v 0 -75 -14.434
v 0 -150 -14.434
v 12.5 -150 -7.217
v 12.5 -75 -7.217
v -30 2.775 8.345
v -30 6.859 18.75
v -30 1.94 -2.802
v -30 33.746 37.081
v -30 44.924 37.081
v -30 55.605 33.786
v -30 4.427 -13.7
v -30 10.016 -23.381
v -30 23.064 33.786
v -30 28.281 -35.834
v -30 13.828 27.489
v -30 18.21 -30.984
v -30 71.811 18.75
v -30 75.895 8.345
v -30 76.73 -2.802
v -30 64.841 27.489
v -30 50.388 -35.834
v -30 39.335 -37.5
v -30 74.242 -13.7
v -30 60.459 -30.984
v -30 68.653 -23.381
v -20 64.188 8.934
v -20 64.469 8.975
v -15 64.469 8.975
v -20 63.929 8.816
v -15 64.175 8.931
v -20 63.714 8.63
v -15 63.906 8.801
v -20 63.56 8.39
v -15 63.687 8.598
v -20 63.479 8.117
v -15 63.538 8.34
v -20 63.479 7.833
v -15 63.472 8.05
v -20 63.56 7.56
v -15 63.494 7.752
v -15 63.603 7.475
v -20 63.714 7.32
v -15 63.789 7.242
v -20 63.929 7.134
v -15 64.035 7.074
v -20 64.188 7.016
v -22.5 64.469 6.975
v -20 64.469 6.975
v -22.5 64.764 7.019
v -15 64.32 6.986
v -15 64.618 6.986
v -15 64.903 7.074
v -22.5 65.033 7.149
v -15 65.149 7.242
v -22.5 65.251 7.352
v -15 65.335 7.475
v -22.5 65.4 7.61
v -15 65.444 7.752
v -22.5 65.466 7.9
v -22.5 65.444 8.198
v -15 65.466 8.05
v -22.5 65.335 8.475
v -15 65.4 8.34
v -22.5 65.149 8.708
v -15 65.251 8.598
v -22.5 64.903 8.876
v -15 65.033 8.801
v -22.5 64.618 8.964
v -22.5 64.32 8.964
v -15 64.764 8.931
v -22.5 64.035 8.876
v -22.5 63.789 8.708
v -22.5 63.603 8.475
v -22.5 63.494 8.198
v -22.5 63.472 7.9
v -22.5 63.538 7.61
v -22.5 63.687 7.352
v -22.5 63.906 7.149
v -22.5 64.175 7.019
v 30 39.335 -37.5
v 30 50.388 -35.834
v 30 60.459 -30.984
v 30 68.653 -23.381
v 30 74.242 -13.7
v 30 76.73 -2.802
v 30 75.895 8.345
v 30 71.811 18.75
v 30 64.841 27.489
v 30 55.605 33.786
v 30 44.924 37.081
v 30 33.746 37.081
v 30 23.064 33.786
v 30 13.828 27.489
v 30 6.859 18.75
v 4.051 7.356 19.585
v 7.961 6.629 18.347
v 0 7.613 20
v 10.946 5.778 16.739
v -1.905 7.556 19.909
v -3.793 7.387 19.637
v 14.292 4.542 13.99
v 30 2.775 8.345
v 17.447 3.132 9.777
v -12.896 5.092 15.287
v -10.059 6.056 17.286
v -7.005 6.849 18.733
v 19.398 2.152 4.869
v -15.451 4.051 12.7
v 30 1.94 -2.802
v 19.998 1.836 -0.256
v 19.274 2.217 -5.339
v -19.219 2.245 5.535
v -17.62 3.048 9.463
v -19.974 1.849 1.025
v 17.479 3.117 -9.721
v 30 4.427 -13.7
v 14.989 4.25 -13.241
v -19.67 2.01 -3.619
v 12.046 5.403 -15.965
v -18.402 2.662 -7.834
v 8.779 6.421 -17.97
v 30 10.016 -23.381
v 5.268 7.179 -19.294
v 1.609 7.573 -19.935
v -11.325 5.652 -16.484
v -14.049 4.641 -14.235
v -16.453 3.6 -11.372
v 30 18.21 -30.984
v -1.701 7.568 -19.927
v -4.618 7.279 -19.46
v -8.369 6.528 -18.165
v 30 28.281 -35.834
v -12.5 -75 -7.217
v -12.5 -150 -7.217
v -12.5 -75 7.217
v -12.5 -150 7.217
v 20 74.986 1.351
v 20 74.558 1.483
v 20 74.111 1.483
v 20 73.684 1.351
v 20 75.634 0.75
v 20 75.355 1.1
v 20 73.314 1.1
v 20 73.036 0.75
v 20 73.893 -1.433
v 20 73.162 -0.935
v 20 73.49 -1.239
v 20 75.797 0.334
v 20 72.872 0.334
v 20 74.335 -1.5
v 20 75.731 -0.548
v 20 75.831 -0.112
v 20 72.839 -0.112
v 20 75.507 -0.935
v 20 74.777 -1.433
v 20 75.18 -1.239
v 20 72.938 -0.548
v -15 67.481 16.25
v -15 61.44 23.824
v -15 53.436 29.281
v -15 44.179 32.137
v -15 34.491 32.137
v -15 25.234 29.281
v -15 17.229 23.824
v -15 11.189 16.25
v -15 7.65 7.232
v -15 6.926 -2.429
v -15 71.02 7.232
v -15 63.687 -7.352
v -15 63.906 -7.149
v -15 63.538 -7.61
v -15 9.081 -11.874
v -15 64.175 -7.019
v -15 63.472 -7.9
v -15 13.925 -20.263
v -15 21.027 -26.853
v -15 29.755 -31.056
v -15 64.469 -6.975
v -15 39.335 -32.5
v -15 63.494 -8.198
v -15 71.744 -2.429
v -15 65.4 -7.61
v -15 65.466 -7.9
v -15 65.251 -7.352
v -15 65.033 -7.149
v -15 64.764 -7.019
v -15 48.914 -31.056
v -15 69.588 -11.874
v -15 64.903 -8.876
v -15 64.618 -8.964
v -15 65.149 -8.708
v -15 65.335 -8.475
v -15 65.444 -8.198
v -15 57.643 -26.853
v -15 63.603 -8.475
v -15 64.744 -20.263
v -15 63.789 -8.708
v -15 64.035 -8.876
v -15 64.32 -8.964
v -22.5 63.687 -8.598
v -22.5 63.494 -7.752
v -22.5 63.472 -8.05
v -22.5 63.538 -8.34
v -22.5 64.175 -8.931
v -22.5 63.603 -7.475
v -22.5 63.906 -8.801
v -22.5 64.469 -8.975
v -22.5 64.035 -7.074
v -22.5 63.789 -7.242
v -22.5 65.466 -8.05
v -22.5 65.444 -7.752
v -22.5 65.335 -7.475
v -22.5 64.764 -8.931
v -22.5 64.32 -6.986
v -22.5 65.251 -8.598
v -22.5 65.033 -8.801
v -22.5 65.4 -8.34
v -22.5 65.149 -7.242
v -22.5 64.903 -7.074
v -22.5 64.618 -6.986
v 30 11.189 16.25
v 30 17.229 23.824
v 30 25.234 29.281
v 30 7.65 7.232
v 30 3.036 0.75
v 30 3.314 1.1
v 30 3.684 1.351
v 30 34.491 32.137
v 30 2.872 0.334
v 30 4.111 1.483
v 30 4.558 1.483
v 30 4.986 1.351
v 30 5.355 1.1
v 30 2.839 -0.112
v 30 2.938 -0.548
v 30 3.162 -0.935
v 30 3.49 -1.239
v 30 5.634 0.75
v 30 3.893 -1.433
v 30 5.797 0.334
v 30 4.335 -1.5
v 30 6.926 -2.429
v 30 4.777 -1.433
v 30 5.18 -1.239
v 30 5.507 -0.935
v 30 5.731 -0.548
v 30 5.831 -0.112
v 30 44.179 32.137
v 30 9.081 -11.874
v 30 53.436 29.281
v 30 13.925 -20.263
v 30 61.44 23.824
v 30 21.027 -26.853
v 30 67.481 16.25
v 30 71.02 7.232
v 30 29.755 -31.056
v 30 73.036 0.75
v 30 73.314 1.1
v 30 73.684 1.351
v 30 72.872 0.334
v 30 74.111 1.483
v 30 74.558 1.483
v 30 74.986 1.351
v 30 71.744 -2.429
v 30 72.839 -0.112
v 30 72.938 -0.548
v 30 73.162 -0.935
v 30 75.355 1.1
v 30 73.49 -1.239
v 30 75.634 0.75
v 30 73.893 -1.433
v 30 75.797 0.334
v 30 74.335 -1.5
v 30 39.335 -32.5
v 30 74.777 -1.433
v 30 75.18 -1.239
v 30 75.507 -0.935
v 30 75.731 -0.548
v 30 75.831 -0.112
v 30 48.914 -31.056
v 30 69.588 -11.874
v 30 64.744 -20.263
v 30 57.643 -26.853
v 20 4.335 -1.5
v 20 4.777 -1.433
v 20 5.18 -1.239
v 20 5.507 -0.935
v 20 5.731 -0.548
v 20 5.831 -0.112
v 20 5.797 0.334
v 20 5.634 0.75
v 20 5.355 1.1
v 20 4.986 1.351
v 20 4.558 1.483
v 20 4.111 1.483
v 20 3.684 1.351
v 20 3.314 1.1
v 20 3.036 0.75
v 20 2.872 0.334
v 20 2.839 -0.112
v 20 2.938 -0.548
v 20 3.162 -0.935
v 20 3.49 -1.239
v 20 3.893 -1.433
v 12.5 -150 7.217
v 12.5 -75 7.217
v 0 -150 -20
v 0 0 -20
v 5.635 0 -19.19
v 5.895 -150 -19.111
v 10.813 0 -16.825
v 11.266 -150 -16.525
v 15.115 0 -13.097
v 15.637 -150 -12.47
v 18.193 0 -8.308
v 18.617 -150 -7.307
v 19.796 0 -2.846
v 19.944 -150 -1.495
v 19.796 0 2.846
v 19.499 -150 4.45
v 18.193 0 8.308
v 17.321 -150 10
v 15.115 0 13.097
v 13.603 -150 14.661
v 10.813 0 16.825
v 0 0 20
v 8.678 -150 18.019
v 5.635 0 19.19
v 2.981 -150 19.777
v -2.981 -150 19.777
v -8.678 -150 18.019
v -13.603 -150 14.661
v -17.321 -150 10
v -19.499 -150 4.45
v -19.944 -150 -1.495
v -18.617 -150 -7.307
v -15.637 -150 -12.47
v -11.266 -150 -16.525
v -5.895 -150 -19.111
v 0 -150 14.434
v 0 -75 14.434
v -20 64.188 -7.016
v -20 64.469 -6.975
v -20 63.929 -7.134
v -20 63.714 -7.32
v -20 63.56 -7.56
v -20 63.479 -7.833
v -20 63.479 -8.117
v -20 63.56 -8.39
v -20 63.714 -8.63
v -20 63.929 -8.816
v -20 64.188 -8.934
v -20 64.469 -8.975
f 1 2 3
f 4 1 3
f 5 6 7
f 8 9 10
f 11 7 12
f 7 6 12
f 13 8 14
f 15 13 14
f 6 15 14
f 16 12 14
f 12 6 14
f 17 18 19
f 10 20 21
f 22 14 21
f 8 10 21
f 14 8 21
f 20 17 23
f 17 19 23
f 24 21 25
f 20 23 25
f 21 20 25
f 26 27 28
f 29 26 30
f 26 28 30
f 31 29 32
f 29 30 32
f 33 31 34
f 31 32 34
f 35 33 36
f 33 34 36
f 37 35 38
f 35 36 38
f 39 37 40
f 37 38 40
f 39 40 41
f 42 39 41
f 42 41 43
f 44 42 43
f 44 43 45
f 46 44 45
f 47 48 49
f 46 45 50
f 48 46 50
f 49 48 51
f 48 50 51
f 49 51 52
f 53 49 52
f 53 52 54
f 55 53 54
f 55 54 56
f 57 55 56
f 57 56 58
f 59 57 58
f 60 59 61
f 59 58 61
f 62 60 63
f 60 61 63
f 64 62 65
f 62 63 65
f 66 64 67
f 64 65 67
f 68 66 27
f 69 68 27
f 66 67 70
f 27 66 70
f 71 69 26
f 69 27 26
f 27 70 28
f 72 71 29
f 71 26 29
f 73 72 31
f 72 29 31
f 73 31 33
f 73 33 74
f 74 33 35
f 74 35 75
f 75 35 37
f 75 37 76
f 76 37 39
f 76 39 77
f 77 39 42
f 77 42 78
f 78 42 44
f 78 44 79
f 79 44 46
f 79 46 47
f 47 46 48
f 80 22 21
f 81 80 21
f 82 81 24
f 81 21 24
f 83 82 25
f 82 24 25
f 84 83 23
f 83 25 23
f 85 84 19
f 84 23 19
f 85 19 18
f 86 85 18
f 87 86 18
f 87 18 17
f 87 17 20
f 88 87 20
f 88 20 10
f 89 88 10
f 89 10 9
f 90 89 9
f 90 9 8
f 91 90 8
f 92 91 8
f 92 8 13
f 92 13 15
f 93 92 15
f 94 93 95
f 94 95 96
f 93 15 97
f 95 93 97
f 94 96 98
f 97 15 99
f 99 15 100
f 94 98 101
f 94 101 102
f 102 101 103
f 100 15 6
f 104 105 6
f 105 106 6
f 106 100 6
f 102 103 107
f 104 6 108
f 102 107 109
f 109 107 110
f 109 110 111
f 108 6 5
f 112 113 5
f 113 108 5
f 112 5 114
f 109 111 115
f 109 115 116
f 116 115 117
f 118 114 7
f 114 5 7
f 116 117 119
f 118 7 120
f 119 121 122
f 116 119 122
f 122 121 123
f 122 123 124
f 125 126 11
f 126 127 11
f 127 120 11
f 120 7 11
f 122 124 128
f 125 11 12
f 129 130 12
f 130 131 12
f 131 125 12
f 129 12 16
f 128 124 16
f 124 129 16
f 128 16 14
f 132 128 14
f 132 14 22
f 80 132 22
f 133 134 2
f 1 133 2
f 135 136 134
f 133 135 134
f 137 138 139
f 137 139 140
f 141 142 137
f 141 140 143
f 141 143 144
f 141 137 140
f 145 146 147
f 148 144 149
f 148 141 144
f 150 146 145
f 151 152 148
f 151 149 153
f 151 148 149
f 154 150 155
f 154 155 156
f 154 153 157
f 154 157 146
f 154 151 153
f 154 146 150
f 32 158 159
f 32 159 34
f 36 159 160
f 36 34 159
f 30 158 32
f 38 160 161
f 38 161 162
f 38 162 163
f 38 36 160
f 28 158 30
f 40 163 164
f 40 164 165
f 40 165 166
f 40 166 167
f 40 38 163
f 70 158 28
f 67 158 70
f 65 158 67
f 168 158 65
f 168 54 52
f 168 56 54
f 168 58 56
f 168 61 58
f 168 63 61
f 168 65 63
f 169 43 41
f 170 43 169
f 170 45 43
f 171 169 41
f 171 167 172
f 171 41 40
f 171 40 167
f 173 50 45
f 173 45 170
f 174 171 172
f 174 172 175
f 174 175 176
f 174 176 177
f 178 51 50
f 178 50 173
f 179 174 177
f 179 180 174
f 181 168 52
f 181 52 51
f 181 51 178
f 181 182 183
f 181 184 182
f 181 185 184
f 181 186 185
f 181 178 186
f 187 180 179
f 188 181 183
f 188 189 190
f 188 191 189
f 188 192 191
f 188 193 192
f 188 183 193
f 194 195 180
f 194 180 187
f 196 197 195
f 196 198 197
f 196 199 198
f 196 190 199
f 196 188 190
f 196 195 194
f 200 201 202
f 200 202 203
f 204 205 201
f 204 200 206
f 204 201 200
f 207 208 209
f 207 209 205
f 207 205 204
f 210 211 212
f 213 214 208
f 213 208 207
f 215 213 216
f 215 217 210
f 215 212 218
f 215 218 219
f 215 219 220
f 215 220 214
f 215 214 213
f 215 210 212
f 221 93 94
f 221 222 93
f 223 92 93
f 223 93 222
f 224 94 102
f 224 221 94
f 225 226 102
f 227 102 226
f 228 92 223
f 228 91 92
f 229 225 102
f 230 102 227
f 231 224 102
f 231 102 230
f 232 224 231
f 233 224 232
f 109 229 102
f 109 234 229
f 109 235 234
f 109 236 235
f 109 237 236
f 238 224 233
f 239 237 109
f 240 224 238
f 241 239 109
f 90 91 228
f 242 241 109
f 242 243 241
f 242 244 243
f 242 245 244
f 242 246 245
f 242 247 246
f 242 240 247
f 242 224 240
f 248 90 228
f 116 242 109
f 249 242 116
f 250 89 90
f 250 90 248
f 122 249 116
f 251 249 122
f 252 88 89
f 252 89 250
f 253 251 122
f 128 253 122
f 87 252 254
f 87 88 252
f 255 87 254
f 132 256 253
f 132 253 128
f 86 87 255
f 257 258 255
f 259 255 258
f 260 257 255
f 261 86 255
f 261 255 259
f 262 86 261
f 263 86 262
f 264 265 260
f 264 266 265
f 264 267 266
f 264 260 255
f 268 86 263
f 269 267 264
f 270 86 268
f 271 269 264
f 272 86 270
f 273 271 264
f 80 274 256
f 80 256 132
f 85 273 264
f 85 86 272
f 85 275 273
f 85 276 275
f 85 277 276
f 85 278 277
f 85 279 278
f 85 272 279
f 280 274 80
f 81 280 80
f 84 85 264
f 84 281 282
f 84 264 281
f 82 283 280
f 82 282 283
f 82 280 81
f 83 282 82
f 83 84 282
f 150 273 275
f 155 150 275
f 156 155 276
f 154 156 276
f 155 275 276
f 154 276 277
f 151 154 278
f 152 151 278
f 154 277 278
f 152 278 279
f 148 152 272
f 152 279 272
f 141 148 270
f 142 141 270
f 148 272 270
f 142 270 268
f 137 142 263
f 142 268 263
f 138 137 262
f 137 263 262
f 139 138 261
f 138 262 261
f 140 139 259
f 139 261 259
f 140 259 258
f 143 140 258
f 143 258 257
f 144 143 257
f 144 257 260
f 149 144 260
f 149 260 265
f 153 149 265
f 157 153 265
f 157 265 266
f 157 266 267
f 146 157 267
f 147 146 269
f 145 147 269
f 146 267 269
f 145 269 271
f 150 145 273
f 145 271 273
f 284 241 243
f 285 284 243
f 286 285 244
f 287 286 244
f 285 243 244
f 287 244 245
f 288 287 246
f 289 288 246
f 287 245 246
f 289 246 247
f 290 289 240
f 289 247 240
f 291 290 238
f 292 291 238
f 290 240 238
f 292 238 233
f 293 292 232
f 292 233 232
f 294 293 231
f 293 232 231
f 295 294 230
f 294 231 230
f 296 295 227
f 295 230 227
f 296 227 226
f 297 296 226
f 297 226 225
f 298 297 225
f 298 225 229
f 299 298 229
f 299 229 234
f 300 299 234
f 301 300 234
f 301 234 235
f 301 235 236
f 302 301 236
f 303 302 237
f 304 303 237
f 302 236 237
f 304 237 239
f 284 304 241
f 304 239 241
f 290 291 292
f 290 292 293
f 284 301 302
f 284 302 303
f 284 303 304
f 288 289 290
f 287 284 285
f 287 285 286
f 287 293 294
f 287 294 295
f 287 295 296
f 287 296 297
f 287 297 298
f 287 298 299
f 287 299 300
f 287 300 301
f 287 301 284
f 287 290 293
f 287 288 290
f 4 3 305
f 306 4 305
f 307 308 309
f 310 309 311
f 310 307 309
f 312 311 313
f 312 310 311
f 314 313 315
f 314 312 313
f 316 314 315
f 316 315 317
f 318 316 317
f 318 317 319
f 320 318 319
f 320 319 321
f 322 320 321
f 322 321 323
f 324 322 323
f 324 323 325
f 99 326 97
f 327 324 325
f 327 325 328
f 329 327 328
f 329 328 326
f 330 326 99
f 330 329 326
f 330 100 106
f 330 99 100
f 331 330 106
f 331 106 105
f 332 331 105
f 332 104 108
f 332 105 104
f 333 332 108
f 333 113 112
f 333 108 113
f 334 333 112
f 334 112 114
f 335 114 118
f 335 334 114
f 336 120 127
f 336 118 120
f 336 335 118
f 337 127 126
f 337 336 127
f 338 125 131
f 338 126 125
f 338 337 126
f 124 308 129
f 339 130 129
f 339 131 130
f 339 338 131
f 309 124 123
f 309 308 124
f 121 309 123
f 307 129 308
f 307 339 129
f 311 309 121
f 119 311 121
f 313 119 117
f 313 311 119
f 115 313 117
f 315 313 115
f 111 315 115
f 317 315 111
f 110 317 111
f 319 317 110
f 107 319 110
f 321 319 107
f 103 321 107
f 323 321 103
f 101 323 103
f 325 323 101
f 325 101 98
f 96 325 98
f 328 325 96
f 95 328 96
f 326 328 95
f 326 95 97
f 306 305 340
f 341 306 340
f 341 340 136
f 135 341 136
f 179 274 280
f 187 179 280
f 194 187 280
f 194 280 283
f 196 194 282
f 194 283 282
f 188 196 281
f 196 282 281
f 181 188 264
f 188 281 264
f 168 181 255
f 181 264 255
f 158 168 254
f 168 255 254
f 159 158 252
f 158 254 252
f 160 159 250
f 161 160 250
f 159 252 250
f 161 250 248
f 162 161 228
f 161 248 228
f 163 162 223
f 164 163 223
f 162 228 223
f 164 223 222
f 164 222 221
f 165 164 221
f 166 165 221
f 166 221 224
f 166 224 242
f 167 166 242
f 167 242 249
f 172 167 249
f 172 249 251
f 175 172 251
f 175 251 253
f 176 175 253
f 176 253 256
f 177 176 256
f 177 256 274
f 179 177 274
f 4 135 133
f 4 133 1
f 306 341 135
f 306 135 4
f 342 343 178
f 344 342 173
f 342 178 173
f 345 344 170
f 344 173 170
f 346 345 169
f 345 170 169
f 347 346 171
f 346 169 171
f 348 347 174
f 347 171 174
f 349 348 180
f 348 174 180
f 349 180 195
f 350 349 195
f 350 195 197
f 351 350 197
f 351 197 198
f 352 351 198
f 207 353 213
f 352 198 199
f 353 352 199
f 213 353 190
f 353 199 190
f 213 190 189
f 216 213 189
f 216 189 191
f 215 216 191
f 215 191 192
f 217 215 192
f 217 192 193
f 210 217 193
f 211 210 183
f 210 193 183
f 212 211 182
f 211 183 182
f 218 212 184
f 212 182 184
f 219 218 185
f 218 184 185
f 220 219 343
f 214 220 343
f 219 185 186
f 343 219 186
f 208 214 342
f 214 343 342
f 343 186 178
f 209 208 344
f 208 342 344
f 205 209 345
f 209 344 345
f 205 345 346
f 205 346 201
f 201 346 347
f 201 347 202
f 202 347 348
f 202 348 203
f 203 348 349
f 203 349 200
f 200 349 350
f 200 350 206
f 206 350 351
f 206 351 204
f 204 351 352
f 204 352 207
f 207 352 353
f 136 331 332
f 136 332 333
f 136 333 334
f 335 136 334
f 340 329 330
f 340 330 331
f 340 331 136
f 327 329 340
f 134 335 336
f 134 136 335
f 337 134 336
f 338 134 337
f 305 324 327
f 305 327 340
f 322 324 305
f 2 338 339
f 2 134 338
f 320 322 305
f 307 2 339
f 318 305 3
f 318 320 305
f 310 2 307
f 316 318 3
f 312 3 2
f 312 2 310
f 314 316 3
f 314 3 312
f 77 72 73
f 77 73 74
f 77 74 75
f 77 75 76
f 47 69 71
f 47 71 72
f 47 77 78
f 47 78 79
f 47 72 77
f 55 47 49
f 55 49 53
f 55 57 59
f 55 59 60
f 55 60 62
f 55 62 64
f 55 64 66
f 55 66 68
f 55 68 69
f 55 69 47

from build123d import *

# Parameters (mm, degrees)
SKETCH1_R                 = 20
BOSS_EXTRUDE1_DEPTH       = 25
BOSS_EXTRUDE2_START       = 100
SKETCH2_R                 = 20
BOSS_EXTRUDE2_DEPTH       = 100
BOSS_EXTRUDE4_START       = -100
SKETCH6_R                 = 20
BOSS_EXTRUDE4_DEPTH       = 100
SKETCH7_R                 = 25
CUT_EXTRUDE2_DEPTH        = 40
SKETCH8_R                 = 25
SKETCH8_R_2               = 22.5
BOSS_EXTRUDE7_DEPTH       = 40
SKETCH9_R                 = 25
BOSS_EXTRUDE8_DEPTH       = 2
BOSS_EXTRUDE10_DEPTH      = 38
CUT_EXTRUDE3_DEPTH        = 25
SKETCH12_R                = 25
CUT_EXTRUDE4_DEPTH        = 75
BOSS_EXTRUDE11_START      = 50
SKETCH14_R                = 20
BOSS_EXTRUDE11_DEPTH      = 50
BOSS_EXTRUDE12_DEPTH      = 10
BOSS_EXTRUDE12_DEPTH_BACK = 50
SKETCH13_R                = 37.5
SKETCH17_R                = 32.5
CUT_EXTRUDE5_DEPTH        = 50
BOSS_EXTRUDE13_START      = 2
SKETCH18_R                = 37.5
SKETCH18_R_2              = 32.5
BOSS_EXTRUDE13_DEPTH      = 2
SKETCH21_R                = 37.5
SKETCH21_R_2              = 32.5
CUT_EXTRUDE6_DEPTH        = 2
SKETCH22_R                = 1.5
CUT_EXTRUDE7_DEPTH        = 10
BOSS_EXTRUDE14_START      = 5
SKETCH27_R                = 32.5
BOSS_EXTRUDE14_DEPTH      = 5
CUT_EXTRUDE8_DEPTH        = 5
SKETCH29_R                = 1
CUT_EXTRUDE9_DEPTH        = 2.5
SKETCH30_R                = 1
CUT_EXTRUDE10_DEPTH       = 2.5


with BuildPart() as part:
    # Sketch1 → Boss-Extrude1 (new body)
    with BuildSketch(Plane(origin=(0, 0, 0), x_dir=(1, 0, 0), z_dir=(0, 1, 0))):
        with Locations(Location((0, 0, 0), (0, 0, 270))):
            Circle(SKETCH1_R)
        Polygon((14.43375673, 0), (7.216878365, 12.5), (-7.216878365, 12.5), (-14.43375673, 0), (-7.216878365, -12.5), (7.216878365, -12.5), align=None, mode=Mode.SUBTRACT)
    extrude(amount=BOSS_EXTRUDE1_DEPTH)

    # Sketch2 → Boss-Extrude2 (add)
    with BuildSketch(Plane.XZ.offset(BOSS_EXTRUDE2_START)):
        with Locations(Location((0, 0, 0), (0, 0, 270))):
            Circle(SKETCH2_R)
    extrude(amount=-BOSS_EXTRUDE2_DEPTH)

    # Sketch6 → Boss-Extrude4 (add)
    with BuildSketch(Plane(origin=(0, 25, 0), x_dir=(1, 0, 0), z_dir=(0, 1, 0)).offset(BOSS_EXTRUDE4_START)):
        with Locations(Location((0, 0, 0), (0, 0, 90))):
            Circle(SKETCH6_R)
    extrude(amount=BOSS_EXTRUDE4_DEPTH)

    # Sketch7 → Cut-Extrude2 (cut)
    with BuildSketch(Plane(origin=(20, 0, 0), x_dir=(0, 0, -1), z_dir=(1, 0, 0))):
        with Locations((0, 39.286563349)):
            Circle(SKETCH7_R)
    extrude(amount=-CUT_EXTRUDE2_DEPTH, mode=Mode.SUBTRACT)

    # Sketch8 → Boss-Extrude7 (add)
    with BuildSketch(Plane(origin=(20, 0, 0), x_dir=(0, 0, -1), z_dir=(1, 0, 0))):
        with Locations((0, 39.252781264)):
            Circle(SKETCH8_R)
        with Locations((0, 39.252781264)):
            Circle(SKETCH8_R_2, mode=Mode.SUBTRACT)
    extrude(amount=-BOSS_EXTRUDE7_DEPTH)

    # Sketch9 → Boss-Extrude8 (add)
    with BuildSketch(Plane(origin=(20, 0, 0), x_dir=(0, 0, -1), z_dir=(1, 0, 0))):
        with Locations((0, 39.252781264)):
            Circle(SKETCH9_R)
    extrude(amount=-BOSS_EXTRUDE8_DEPTH)

    # Sketch10 → Boss-Extrude10 (add)
    with BuildSketch(Plane.ZY.offset(-18)):
        with BuildLine():
            Line((-15.081099266, 22.555163323), (15.081099266, 22.555163323))
            ThreePointArc((15.081099266, 22.555163323), (0, 16.752781264), (-15.081099266, 22.555163323))
        make_face()
    extrude(amount=BOSS_EXTRUDE10_DEPTH)

    # Sketch11 → Cut-Extrude3 (cut)
    with BuildSketch(Plane.XZ.offset(100)):
        Polygon((12.5, 7.216878365), (0, 14.43375673), (0, 0), (12.5, 0), align=None)
        Polygon((0, 0), (0, 14.43375673), (-12.5, 7.216878365), (-12.5, -7.216878365), (0, -14.43375673), (12.5, -7.216878365), (12.5, 0), align=None)
    extrude(amount=-CUT_EXTRUDE3_DEPTH, mode=Mode.SUBTRACT)

    # Sketch12 → Cut-Extrude4 (cut)
    with BuildSketch(Plane(origin=(20, 0, 0), x_dir=(0, 0, -1), z_dir=(1, 0, 0))):
        with Locations((0, 39.252781264)):
            Circle(SKETCH12_R)
    extrude(amount=-CUT_EXTRUDE4_DEPTH, mode=Mode.SUBTRACT)

    # Sketch14 → Boss-Extrude11 (add)
    with BuildSketch(Plane.XZ.offset(100).offset(BOSS_EXTRUDE11_START)):
        with Locations(Location((0, 0, 0), (0, 0, 270))):
            Circle(SKETCH14_R)
        Polygon((0, -14.43375673), (12.5, -7.216878365), (12.5, 7.216878365), (0, 14.43375673), (-12.5, 7.216878365), (-12.5, -7.216878365), align=None, mode=Mode.SUBTRACT)
    extrude(amount=-BOSS_EXTRUDE11_DEPTH)

    # Sketch13 → Boss-Extrude12 (add, two sides: drawn at the far end of the back side and taken through both)
    with BuildSketch(Plane(origin=(20, 0, 0), x_dir=(0, 0, -1), z_dir=(1, 0, 0)).offset(-BOSS_EXTRUDE12_DEPTH_BACK)):
        with Locations((0, 39.33472939)):
            Circle(SKETCH13_R)
    extrude(amount=BOSS_EXTRUDE12_DEPTH + BOSS_EXTRUDE12_DEPTH_BACK)

    # Sketch17 → Cut-Extrude5 (cut)
    with BuildSketch(Plane(origin=(30, 0, 0), x_dir=(0, 0, -1), z_dir=(1, 0, 0))):
        with Locations((0, 39.33472939)):
            Circle(SKETCH17_R)
    extrude(amount=-CUT_EXTRUDE5_DEPTH, mode=Mode.SUBTRACT)

    # Sketch18 → Boss-Extrude13 (add)
    with BuildSketch(Plane(origin=(30, 0, 0), x_dir=(0, 0, -1), z_dir=(1, 0, 0)).offset(BOSS_EXTRUDE13_START)):
        with Locations((0, 39.33472939)):
            Circle(SKETCH18_R)
        with Locations((0, 39.33472939)):
            Circle(SKETCH18_R_2, mode=Mode.SUBTRACT)
    extrude(amount=-BOSS_EXTRUDE13_DEPTH)

    # Sketch21 → Cut-Extrude6 (cut)
    with BuildSketch(Plane(origin=(32, 0, 0), x_dir=(0, 0, -1), z_dir=(1, 0, 0))):
        with Locations((0, 39.33472939)):
            Circle(SKETCH21_R)
        with Locations((0, 39.33472939)):
            Circle(SKETCH21_R_2, mode=Mode.SUBTRACT)
    extrude(amount=-CUT_EXTRUDE6_DEPTH, mode=Mode.SUBTRACT)

    # Sketch22 → Cut-Extrude7 (cut)
    with BuildSketch(Plane(origin=(30, 0, 0), x_dir=(0, 0, -1), z_dir=(1, 0, 0))):
        with Locations((0, 74.33472939)):
            Circle(SKETCH22_R)
        with Locations((0, 4.33472939)):
            Circle(SKETCH22_R)
    extrude(amount=-CUT_EXTRUDE7_DEPTH, mode=Mode.SUBTRACT)

    # Sketch27 → Boss-Extrude14 (add)
    with BuildSketch(Plane(origin=(-20, 0, 0), x_dir=(0, 0, -1), z_dir=(1, 0, 0)).offset(BOSS_EXTRUDE14_START)):
        with Locations((0, 39.33472939)):
            Circle(SKETCH27_R)
    extrude(amount=-BOSS_EXTRUDE14_DEPTH)

    # Sketch28 → Cut-Extrude8 (cut)
    with BuildSketch(Plane(origin=(-15, 0, 0), x_dir=(0, 0, -1), z_dir=(1, 0, 0))):
        with BuildLine():
            ThreePointArc((-6.975, 64.469273085), (-7.975, 65.469273085), (-8.975, 64.469273085))
            Line((-8.975, 64.469273085), (-6.975, 64.469273085))
        make_face()
        with BuildLine():
            Line((-6.975, 64.469273085), (-8.975, 64.469273085))
            ThreePointArc((-8.975, 64.469273085), (-7.975, 63.469273085), (-6.975, 64.469273085))
        make_face()
        with BuildLine():
            ThreePointArc((8.975, 64.469273085), (7.975, 65.469273085), (6.975, 64.469273085))
            Line((6.975, 64.469273085), (8.975, 64.469273085))
        make_face()
        with BuildLine():
            Line((8.975, 64.469273085), (6.975, 64.469273085))
            ThreePointArc((6.975, 64.469273085), (7.975, 63.469273085), (8.975, 64.469273085))
        make_face()
    extrude(amount=-CUT_EXTRUDE8_DEPTH, mode=Mode.SUBTRACT)

    # Sketch29 → Cut-Extrude9 (cut)
    with BuildSketch(Plane(origin=(-20, 0, 0), x_dir=(0, 0, -1), z_dir=(1, 0, 0))):
        with Locations((7.975, 64.469273085)):
            Circle(SKETCH29_R)
    extrude(amount=-CUT_EXTRUDE9_DEPTH, mode=Mode.SUBTRACT)

    # Sketch30 → Cut-Extrude10 (cut)
    with BuildSketch(Plane(origin=(-20, 0, 0), x_dir=(0, 0, -1), z_dir=(1, 0, 0))):
        with Locations((-7.975, 64.469273085)):
            Circle(SKETCH30_R)
    extrude(amount=-CUT_EXTRUDE10_DEPTH, mode=Mode.SUBTRACT)


solid = part.part
